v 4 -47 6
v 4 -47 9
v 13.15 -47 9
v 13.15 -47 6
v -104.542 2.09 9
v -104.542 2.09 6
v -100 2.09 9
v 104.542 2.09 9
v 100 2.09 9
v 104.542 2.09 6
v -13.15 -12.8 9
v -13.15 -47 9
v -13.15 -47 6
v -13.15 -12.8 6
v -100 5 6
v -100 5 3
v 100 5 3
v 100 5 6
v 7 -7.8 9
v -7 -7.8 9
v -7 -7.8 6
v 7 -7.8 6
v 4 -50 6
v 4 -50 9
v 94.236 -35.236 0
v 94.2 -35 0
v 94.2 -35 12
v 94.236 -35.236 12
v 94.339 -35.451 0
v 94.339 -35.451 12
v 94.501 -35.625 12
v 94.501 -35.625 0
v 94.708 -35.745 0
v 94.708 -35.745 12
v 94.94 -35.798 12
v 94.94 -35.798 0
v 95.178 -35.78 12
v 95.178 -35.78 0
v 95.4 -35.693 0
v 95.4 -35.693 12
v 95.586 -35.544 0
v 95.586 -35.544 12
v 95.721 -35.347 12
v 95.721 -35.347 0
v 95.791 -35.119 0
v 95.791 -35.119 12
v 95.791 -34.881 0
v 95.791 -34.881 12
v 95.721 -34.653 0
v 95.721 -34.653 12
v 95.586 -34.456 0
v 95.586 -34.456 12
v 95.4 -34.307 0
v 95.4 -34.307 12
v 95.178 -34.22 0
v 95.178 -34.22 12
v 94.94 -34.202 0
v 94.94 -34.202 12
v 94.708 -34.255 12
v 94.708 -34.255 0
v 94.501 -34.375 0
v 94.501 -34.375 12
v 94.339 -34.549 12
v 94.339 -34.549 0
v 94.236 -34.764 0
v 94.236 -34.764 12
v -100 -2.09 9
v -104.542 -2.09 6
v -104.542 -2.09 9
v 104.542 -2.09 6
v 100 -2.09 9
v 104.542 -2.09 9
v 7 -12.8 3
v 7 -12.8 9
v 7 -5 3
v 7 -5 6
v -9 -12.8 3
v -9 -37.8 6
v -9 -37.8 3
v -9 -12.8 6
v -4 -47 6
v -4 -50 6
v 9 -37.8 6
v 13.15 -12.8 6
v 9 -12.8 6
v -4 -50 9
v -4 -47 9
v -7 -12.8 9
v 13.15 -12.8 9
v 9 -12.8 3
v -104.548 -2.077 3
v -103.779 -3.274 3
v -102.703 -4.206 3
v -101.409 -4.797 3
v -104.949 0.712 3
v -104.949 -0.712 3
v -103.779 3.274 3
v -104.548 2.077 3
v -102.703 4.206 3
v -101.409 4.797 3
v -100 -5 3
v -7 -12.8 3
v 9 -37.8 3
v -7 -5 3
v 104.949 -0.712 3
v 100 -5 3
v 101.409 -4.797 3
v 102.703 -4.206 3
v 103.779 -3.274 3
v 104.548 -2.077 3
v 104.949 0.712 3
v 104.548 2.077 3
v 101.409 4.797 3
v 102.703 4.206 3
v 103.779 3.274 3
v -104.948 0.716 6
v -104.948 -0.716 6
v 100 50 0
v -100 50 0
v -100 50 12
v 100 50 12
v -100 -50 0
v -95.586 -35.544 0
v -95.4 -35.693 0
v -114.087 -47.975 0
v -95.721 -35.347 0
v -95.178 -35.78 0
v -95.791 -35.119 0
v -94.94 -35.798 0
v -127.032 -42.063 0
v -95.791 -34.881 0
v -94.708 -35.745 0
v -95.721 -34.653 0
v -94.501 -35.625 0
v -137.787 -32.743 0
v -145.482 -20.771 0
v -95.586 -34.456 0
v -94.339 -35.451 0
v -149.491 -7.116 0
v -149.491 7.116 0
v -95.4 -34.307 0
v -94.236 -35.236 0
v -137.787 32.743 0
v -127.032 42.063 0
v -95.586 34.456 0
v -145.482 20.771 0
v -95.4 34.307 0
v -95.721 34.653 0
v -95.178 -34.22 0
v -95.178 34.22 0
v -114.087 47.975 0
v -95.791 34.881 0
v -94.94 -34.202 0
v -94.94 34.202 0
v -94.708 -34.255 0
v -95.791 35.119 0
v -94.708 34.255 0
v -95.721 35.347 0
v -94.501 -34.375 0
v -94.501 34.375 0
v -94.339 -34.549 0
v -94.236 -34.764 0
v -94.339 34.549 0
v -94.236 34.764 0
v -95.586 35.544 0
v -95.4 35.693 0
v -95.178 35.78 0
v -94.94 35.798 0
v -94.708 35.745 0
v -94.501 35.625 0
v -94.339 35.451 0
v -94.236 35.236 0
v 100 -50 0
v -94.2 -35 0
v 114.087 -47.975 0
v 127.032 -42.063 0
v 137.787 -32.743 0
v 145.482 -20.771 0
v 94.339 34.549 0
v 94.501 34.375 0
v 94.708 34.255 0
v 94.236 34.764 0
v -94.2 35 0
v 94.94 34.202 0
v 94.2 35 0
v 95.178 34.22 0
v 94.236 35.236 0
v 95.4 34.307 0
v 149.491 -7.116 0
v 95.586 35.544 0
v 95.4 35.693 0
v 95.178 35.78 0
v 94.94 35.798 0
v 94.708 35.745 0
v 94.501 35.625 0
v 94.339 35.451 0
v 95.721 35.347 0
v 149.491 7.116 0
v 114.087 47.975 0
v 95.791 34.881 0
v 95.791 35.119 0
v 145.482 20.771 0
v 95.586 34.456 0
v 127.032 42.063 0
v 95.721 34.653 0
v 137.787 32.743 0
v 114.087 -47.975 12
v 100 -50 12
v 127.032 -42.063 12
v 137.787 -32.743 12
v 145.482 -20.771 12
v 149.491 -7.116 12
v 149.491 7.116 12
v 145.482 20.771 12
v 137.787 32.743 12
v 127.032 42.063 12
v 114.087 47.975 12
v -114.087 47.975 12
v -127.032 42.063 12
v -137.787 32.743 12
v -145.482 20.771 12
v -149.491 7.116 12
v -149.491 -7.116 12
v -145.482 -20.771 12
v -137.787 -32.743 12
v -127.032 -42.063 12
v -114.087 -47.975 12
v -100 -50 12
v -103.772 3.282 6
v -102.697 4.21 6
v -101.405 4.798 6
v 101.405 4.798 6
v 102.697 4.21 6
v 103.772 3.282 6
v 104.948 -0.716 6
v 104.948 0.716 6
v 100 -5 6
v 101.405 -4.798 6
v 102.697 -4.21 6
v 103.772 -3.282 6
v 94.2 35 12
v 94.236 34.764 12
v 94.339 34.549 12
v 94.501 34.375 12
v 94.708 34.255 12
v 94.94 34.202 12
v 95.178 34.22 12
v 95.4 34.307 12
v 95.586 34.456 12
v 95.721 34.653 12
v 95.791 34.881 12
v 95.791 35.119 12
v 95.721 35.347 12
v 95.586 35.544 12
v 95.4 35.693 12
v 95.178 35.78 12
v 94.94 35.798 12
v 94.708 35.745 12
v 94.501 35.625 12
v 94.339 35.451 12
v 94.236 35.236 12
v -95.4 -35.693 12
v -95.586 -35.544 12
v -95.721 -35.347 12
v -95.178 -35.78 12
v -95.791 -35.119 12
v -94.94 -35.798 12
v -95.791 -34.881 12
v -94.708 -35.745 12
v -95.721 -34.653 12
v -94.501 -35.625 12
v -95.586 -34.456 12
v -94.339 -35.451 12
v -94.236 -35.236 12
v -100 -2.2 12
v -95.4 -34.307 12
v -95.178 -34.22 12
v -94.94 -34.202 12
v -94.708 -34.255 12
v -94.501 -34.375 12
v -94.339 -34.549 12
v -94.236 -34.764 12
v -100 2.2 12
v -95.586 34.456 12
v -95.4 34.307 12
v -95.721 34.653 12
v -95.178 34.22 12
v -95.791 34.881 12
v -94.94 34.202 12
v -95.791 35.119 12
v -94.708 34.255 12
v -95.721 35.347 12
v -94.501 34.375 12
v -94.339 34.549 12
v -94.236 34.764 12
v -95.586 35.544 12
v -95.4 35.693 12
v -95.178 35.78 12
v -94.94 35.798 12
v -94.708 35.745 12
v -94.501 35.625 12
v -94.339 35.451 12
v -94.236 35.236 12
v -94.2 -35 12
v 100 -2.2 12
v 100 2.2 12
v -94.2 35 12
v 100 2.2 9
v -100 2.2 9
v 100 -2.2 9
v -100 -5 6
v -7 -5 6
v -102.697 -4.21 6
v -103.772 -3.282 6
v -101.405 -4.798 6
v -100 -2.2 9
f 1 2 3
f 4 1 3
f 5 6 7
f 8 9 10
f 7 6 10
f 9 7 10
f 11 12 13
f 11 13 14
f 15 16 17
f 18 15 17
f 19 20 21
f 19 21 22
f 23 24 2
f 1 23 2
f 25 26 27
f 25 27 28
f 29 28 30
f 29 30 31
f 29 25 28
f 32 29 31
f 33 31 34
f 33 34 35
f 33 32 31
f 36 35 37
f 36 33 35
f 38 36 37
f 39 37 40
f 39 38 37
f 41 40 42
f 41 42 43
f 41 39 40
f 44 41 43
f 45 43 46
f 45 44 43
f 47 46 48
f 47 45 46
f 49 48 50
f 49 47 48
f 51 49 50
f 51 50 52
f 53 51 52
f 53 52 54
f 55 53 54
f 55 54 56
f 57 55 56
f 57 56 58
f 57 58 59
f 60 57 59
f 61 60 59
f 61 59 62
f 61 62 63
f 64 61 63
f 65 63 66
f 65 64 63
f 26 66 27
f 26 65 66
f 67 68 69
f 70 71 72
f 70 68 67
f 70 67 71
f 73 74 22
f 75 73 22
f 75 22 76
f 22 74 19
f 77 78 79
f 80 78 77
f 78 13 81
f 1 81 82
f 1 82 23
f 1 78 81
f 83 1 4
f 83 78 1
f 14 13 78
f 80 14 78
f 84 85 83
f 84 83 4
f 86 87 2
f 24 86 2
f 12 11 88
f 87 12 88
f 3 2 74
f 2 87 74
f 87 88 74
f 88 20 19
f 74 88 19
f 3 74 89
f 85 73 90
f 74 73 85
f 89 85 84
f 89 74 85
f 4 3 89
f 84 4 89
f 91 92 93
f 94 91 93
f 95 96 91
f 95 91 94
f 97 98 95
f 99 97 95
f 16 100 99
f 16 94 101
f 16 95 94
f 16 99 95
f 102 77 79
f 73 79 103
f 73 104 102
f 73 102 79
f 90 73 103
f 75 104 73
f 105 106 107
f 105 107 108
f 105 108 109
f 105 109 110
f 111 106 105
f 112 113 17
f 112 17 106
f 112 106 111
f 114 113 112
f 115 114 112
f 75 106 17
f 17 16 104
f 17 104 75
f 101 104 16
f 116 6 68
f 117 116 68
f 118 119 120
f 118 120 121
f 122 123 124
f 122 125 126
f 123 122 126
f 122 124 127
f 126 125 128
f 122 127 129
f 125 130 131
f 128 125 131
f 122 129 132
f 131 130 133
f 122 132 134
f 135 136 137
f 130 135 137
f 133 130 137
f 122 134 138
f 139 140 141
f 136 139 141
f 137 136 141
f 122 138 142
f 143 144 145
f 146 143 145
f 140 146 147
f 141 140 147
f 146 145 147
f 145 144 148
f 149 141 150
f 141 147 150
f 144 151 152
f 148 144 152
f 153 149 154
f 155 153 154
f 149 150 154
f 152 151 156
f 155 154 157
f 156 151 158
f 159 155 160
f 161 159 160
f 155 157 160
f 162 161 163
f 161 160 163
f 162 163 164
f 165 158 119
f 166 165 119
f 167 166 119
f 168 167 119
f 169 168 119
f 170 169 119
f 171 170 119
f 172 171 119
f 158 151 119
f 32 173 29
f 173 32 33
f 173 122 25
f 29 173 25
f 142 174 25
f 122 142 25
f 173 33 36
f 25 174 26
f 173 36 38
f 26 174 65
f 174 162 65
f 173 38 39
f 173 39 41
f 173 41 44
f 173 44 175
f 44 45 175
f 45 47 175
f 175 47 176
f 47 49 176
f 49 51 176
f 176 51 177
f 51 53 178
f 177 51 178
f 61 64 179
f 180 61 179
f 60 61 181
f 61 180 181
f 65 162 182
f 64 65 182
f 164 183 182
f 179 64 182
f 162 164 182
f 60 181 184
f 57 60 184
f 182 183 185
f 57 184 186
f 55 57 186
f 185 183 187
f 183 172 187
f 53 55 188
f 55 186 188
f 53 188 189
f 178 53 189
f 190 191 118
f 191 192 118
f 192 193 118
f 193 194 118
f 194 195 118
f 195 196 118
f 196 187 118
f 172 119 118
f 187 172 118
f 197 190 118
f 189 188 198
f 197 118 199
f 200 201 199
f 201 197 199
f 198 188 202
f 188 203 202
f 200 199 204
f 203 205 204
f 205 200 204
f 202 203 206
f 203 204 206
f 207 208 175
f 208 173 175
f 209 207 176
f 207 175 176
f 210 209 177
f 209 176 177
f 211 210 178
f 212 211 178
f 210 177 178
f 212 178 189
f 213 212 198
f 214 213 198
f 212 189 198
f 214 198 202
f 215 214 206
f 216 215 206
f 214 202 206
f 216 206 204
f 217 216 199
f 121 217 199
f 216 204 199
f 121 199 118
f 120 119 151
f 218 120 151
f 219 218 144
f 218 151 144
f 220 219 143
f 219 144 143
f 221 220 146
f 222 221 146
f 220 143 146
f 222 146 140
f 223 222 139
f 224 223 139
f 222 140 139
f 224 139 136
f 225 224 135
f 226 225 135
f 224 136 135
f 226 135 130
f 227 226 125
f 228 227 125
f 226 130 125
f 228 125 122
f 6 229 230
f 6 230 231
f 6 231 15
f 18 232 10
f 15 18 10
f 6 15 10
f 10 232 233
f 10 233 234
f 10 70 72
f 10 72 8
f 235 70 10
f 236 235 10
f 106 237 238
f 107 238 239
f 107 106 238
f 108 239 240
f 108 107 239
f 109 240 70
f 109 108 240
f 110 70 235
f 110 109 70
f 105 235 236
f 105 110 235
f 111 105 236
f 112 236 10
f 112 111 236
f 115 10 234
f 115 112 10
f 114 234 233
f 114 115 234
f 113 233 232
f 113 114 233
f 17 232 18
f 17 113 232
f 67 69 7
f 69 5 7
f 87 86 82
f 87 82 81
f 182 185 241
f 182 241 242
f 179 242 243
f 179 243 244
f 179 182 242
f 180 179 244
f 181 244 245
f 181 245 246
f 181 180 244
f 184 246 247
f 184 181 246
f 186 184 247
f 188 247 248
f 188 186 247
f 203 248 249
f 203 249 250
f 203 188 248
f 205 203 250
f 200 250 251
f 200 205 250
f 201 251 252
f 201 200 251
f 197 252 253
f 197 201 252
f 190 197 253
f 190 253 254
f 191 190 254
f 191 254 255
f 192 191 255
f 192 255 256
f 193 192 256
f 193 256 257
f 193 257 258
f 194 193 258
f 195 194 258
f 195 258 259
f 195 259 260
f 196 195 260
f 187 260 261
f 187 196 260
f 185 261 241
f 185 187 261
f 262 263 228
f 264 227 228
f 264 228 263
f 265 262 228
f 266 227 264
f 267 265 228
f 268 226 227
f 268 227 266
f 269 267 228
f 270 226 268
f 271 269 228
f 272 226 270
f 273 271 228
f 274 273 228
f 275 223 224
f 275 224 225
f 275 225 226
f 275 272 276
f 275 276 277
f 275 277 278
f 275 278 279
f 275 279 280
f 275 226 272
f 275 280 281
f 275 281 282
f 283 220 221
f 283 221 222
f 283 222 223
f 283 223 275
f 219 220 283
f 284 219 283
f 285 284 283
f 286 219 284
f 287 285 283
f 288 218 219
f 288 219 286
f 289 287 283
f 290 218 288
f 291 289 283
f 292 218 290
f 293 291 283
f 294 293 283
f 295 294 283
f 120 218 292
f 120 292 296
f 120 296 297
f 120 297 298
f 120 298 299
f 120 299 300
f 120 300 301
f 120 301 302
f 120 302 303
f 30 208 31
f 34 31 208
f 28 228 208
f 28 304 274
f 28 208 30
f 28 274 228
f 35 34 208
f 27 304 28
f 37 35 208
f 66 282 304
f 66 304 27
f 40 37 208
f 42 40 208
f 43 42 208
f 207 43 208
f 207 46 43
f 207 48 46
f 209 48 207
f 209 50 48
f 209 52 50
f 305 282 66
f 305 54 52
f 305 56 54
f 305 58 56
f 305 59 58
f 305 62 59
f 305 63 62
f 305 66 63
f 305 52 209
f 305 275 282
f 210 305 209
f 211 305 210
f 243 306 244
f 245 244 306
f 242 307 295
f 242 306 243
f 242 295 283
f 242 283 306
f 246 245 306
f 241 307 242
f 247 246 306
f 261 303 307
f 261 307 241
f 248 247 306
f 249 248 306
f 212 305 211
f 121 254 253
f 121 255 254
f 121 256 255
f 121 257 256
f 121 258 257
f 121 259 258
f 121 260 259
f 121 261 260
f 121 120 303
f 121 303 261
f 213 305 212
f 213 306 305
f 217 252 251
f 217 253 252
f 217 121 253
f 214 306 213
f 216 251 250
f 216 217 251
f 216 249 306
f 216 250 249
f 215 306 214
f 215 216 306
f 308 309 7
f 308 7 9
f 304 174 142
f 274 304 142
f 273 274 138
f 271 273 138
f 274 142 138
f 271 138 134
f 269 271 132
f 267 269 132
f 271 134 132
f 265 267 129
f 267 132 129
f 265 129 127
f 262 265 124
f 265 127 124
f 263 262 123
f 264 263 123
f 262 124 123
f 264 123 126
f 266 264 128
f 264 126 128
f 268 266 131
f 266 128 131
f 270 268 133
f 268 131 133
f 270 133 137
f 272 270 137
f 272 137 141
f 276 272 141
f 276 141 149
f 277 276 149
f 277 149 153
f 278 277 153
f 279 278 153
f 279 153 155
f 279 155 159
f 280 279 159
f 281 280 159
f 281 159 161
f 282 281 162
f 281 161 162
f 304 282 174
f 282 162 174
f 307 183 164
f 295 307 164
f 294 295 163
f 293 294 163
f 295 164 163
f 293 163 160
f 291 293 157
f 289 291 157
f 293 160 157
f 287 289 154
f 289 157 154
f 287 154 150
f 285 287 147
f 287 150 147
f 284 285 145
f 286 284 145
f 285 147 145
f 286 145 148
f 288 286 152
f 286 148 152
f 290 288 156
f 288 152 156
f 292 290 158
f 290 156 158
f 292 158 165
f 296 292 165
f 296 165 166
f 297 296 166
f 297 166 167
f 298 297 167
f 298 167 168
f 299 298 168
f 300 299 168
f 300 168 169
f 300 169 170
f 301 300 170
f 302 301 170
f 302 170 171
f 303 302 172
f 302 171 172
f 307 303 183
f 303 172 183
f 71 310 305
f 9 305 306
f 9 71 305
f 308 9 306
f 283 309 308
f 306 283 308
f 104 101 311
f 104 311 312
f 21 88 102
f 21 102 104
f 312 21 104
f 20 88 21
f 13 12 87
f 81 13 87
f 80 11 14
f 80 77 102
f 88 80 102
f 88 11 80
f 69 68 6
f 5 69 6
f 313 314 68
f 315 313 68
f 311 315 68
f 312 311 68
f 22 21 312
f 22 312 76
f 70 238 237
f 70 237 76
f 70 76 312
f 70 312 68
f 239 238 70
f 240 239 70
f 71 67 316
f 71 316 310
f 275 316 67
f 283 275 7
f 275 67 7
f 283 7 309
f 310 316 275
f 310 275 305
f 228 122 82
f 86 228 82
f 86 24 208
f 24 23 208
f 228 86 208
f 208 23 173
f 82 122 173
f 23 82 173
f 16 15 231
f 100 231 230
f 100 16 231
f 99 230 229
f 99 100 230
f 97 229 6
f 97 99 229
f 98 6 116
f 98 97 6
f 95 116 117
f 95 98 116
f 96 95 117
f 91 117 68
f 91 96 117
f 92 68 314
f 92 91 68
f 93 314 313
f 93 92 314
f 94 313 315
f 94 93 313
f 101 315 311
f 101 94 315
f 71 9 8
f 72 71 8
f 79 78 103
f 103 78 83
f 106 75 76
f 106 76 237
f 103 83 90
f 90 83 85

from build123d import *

# Parameters (mm, degrees)
PAD_DEPTH       = 3
PAD001_DEPTH    = 3
SKETCH002_W     = 209.08447
SKETCH002_H     = 4.18
PAD002_DEPTH    = 3
SKETCH003_W     = 26.3
SKETCH003_H     = 34.2
POCKET_DEPTH    = 3
SKETCH004_W     = 18
SKETCH004_H     = 25
POCKET001_DEPTH = 3
SKETCH005_W     = 14
SKETCH005_H     = 5
POCKET002_DEPTH = 6
SKETCH006_W     = 14
SKETCH006_H     = 3
POCKET003_DEPTH = 3
SKETCH007_W     = 8
SKETCH007_H     = 3
POCKET004_DEPTH = 3
SKETCH008_W     = 200
SKETCH008_H     = 4.4
PAD003_DEPTH    = 3
SKETCH009_R     = 0.8
POCKET005_DEPTH = 12


with BuildPart() as part:
    # Sketch → Pad (new body)
    with BuildSketch(Plane.XY):
        with BuildLine():
            ThreePointArc((-100, 50), (-150, 0), (-100, -50))
            Line((-100, -50), (100, -50))
            ThreePointArc((100, -50), (150, 0), (100, 50))
            Line((-100, 50), (100, 50))
        make_face()
    extrude(amount=PAD_DEPTH)

    # Sketch001 (on Face6 of Pad) → Pad001 (join)
    with BuildSketch(Plane.XY.offset(3)):
        with BuildLine():
            ThreePointArc((-100, 50), (-150, 0), (-100, -50))
            Line((-100, -50), (100, -50))
            ThreePointArc((100, -50), (150, 0), (100, 50))
            Line((-100, 50), (100, 50))
        make_face()
        with BuildLine():
            ThreePointArc((-100, 5), (-105, 0), (-100, -5))
            Line((-100, -5), (100, -5))
            ThreePointArc((100, -5), (105, 0), (100, 5))
            Line((-100, 5), (100, 5))
        make_face(mode=Mode.SUBTRACT)
    extrude(amount=PAD001_DEPTH)

    # Sketch002 (on Face9 of Pad001) → Pad002 (join)
    with BuildSketch(Plane.XY.offset(6)):
        with BuildLine():
            ThreePointArc((-100, 50), (-150, 0), (-100, -50))
            Line((-100, -50), (100, -50))
            ThreePointArc((100, -50), (150, 0), (100, 50))
            Line((-100, 50), (100, 50))
        make_face()
        Rectangle(SKETCH002_W, SKETCH002_H, mode=Mode.SUBTRACT)
    extrude(amount=PAD002_DEPTH)

    # Sketch003 (on Face13 of Pad002) → Pocket (cut)
    with BuildSketch(Plane.XY.offset(9)):
        with Locations((0, -29.9)):
            Rectangle(SKETCH003_W, SKETCH003_H)
    extrude(amount=-POCKET_DEPTH, mode=Mode.SUBTRACT)

    # Sketch004 (on Face27 of Pocket) → Pocket001 (cut)
    with BuildSketch(Plane.XY.offset(6)):
        with Locations((0, -25.3)):
            Rectangle(SKETCH004_W, SKETCH004_H)
    extrude(amount=-POCKET001_DEPTH, mode=Mode.SUBTRACT)

    # Sketch005 (on Face13 of Pocket001) → Pocket002 (cut)
    with BuildSketch(Plane.XY.offset(9)):
        with Locations((0, -10.3)):
            Rectangle(SKETCH005_W, SKETCH005_H)
    extrude(amount=-POCKET002_DEPTH, mode=Mode.SUBTRACT)

    # Sketch006 (on Face23 of Pocket002) → Pocket003 (cut)
    with BuildSketch(Plane.XZ.offset(7.8)):
        with Locations((0, 4.5)):
            Rectangle(SKETCH006_W, SKETCH006_H)
    extrude(amount=-POCKET003_DEPTH, mode=Mode.SUBTRACT)

    # Sketch007 (on Face13 of Pocket003) → Pocket004 (cut)
    with BuildSketch(Plane.XY.offset(9)):
        with Locations((0, -48.5)):
            Rectangle(SKETCH007_W, SKETCH007_H)
    extrude(amount=-POCKET004_DEPTH, mode=Mode.SUBTRACT)

    # Sketch008 (on Face15 of Pocket004) → Pad003 (join)
    with BuildSketch(Plane.XY.offset(9)):
        with BuildLine():
            ThreePointArc((-100, 50), (-150, 0), (-100, -50))
            Line((-100, -50), (100, -50))
            ThreePointArc((100, -50), (150, 0), (100, 50))
            Line((-100, 50), (100, 50))
        make_face()
        Rectangle(SKETCH008_W, SKETCH008_H, mode=Mode.SUBTRACT)
    extrude(amount=PAD003_DEPTH)

    # Sketch009 (on Face4 of Pad003) → Pocket005 (cut)
    with BuildSketch(Plane(origin=(0, 0, 0), x_dir=(1, 0, 0), z_dir=(0, 0, -1))):
        with Locations((-95, 35)):
            Circle(SKETCH009_R)
        with Locations((-95, -35)):
            Circle(SKETCH009_R)
    pocket005 = extrude(amount=-POCKET005_DEPTH, mode=Mode.SUBTRACT)

    # Mirrored: Pocket005 across Sketch009 V_Axis
    add(pocket005.mirror(Plane(origin=(0, 0, 0), x_dir=(0, 0, -1), z_dir=(1, 0, 0))), mode=Mode.SUBTRACT)


solid = part.part
